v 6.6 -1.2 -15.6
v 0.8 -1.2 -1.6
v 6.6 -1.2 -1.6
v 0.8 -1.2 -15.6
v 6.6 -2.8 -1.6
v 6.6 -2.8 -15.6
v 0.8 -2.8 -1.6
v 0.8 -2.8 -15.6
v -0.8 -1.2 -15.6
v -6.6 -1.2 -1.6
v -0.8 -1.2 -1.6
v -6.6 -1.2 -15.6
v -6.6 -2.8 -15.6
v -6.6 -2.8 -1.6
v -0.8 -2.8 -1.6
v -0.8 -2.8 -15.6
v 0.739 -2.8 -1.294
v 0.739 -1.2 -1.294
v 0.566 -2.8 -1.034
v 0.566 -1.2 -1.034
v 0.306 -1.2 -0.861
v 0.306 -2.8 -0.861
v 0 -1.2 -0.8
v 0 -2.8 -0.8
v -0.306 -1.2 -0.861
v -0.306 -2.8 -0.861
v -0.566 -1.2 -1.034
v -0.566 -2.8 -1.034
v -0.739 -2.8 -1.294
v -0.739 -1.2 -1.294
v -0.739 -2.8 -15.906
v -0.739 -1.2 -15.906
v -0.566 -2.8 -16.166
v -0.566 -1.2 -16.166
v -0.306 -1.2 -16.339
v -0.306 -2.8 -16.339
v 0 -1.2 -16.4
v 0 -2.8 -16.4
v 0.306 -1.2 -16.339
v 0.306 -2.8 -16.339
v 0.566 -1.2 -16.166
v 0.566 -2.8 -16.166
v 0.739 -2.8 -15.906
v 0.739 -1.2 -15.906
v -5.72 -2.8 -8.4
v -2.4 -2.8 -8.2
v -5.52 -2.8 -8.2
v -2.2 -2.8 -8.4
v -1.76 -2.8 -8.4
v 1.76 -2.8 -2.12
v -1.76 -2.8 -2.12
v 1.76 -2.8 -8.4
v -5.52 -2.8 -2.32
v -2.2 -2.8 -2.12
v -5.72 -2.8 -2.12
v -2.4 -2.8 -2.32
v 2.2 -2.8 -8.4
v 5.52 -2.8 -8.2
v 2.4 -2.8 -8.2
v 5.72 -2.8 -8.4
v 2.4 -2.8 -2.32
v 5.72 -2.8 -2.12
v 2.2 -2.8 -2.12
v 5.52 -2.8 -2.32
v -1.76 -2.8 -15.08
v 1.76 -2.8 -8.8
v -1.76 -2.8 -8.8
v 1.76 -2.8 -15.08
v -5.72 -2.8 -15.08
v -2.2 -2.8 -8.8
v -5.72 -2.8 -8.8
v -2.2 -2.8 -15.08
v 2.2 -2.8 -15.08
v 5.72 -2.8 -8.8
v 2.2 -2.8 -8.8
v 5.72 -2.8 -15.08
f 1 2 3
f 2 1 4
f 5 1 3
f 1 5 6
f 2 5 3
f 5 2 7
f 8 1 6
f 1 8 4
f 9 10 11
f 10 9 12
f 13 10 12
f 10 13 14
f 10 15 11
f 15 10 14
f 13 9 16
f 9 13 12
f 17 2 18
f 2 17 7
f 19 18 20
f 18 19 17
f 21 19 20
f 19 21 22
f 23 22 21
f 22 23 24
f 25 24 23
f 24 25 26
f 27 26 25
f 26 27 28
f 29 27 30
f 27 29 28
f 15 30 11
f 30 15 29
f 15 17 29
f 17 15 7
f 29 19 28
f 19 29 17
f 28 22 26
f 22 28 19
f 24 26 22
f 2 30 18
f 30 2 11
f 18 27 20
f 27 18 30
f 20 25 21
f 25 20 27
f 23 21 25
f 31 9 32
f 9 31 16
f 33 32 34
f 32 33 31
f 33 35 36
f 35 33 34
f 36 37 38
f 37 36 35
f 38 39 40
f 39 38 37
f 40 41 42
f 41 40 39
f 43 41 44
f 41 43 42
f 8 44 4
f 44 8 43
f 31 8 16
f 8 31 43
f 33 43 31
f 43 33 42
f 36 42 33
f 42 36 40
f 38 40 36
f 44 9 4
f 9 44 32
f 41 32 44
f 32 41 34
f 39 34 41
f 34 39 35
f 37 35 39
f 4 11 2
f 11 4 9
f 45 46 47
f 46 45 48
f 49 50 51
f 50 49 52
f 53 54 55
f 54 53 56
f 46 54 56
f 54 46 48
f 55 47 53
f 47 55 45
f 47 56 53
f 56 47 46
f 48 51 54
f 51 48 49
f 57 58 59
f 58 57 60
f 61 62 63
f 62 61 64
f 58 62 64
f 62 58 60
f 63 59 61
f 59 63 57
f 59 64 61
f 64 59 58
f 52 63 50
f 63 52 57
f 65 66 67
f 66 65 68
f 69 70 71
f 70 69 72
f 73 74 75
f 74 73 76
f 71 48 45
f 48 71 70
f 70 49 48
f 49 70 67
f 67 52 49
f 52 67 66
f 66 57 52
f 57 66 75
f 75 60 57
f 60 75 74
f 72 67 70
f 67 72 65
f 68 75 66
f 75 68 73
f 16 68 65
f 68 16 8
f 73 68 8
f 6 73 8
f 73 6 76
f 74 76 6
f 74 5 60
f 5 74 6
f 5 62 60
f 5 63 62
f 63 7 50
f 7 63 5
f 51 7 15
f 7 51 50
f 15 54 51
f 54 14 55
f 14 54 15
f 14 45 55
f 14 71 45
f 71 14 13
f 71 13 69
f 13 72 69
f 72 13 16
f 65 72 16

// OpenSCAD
// file: ../p/4-4edge.scad
use <../lib.scad>
$fa=1; $fs=0.2;
function ldraw_lib__4_4edge(realsolid=false) = [
// 0 Circle 1.0
// 0 Name: 4-4edge.dat
// 0 Author: James Jessiman
// 0 !LDRAW_ORG Primitive UPDATE 2017-01
// 0 !LICENSE Licensed under CC BY 2.0 and CC BY 4.0 : see CAreadme.txt
// 
// 0 BFC CERTIFY CCW
  [0,"BFC","CERTIFY"],
  [0,"BFC","CCW"],
// 
// 0 !HISTORY 1998-12-15 [PTadmin] Official Update 1998-10
// 0 !HISTORY 2005-12-28 [PTadmin] Official Update 2005-01
// 0 !HISTORY 2007-06-24 [PTadmin] Header formatted for Contributor Agreement
// 0 !HISTORY 2008-07-01 [PTadmin] Official Update 2008-01
// 0 !HISTORY 2017-01-15 [Steffen] BFCed
// 0 !HISTORY 2017-12-30 [PTadmin] Official Update 2017-01
// 
// 
// 2 24 1 0 0 0.9239 0 0.3827
  [2,24,1,0,0,0.9239,0,0.3827],
// 2 24 0.9239 0 0.3827 0.7071 0 0.7071
  [2,24,0.9239,0,0.3827,0.7071,0,0.7071],
// 2 24 0.7071 0 0.7071 0.3827 0 0.9239
  [2,24,0.7071,0,0.7071,0.3827,0,0.9239],
// 2 24 0.3827 0 0.9239 0 0 1
  [2,24,0.3827,0,0.9239,0,0,1],
// 2 24 0 0 1 -0.3827 0 0.9239
  [2,24,0,0,1,-0.3827,0,0.9239],
// 2 24 -0.3827 0 0.9239 -0.7071 0 0.7071
  [2,24,-0.3827,0,0.9239,-0.7071,0,0.7071],
// 2 24 -0.7071 0 0.7071 -0.9239 0 0.3827
  [2,24,-0.7071,0,0.7071,-0.9239,0,0.3827],
// 2 24 -0.9239 0 0.3827 -1 0 -0
  [2,24,-0.9239,0,0.3827,-1,0,-0],
// 2 24 -1 0 -0 -0.9239 0 -0.3827
  [2,24,-1,0,-0,-0.9239,0,-0.3827],
// 2 24 -0.9239 0 -0.3827 -0.7071 0 -0.7071
  [2,24,-0.9239,0,-0.3827,-0.7071,0,-0.7071],
// 2 24 -0.7071 0 -0.7071 -0.3827 0 -0.9239
  [2,24,-0.7071,0,-0.7071,-0.3827,0,-0.9239],
// 2 24 -0.3827 0 -0.9239 0 0 -1
  [2,24,-0.3827,0,-0.9239,0,0,-1],
// 2 24 0 0 -1 0.3827 0 -0.9239
  [2,24,0,0,-1,0.3827,0,-0.9239],
// 2 24 0.3827 0 -0.9239 0.7071 0 -0.7071
  [2,24,0.3827,0,-0.9239,0.7071,0,-0.7071],
// 2 24 0.7071 0 -0.7071 0.9239 0 -0.3827
  [2,24,0.7071,0,-0.7071,0.9239,0,-0.3827],
// 2 24 0.9239 0 -0.3827 1 0 0
  [2,24,0.9239,0,-0.3827,1,0,0],
];
module ldraw_lib__4_4edge(step=0, col=false, unit=2/5, alt=false, line=0.2, solid=!$preview)
    makepoly(ldraw_lib__4_4edge(solid), step=step, col=col, unit=unit, alt=alt, line=line, solid=solid);
ldraw_lib__4_4edge(line=0.2);
// file: ../p/4-4disc.scad
use <../lib.scad>
$fa=1; $fs=0.2;
function ldraw_lib__4_4disc(realsolid=false) = [
// 0 Disc 1.0
// 0 Name: 4-4disc.dat
// 0 Author: James Jessiman
// 0 !LDRAW_ORG Primitive UPDATE 2002-02
// 0 !LICENSE Licensed under CC BY 2.0 and CC BY 4.0 : see CAreadme.txt
// 
// 0 BFC CERTIFY CCW
  [0,"BFC","CERTIFY"],
  [0,"BFC","CCW"],
// 
// 0 !HISTORY 1998-12-15 [PTadmin] Official Update 1998-10
// 0 !HISTORY 2002-03-23 [sbliss] Added BFC statement
// 0 !HISTORY 2002-04-25 [PTadmin] Official Update 2002-02
// 0 !HISTORY 2007-06-24 [PTadmin] Header formatted for Contributor Agreement
// 0 !HISTORY 2008-07-01 [PTadmin] Official Update 2008-01
// 
// 
// 3 16 0 0 0 1 0 0 0.9239 0 0.3827
  [3,16,0,0,0,1,0,0,0.9239,0,0.3827],
// 3 16 0 0 0 0.9239 0 0.3827 0.7071 0 0.7071
  [3,16,0,0,0,0.9239,0,0.3827,0.7071,0,0.7071],
// 3 16 0 0 0 0.7071 0 0.7071 0.3827 0 0.9239
  [3,16,0,0,0,0.7071,0,0.7071,0.3827,0,0.9239],
// 3 16 0 0 0 0.3827 0 0.9239 0 0 1
  [3,16,0,0,0,0.3827,0,0.9239,0,0,1],
// 3 16 0 0 0 0 0 1 -0.3827 0 0.9239
  [3,16,0,0,0,0,0,1,-0.3827,0,0.9239],
// 3 16 0 0 0 -0.3827 0 0.9239 -0.7071 0 0.7071
  [3,16,0,0,0,-0.3827,0,0.9239,-0.7071,0,0.7071],
// 3 16 0 0 0 -0.7071 0 0.7071 -0.9239 0 0.3827
  [3,16,0,0,0,-0.7071,0,0.7071,-0.9239,0,0.3827],
// 3 16 0 0 0 -0.9239 0 0.3827 -1 0 -0
  [3,16,0,0,0,-0.9239,0,0.3827,-1,0,-0],
// 3 16 0 0 0 -1 0 -0 -0.9239 0 -0.3827
  [3,16,0,0,0,-1,0,-0,-0.9239,0,-0.3827],
// 3 16 0 0 0 -0.9239 0 -0.3827 -0.7071 0 -0.7071
  [3,16,0,0,0,-0.9239,0,-0.3827,-0.7071,0,-0.7071],
// 3 16 0 0 0 -0.7071 0 -0.7071 -0.3827 0 -0.9239
  [3,16,0,0,0,-0.7071,0,-0.7071,-0.3827,0,-0.9239],
// 3 16 0 0 0 -0.3827 0 -0.9239 0 0 -1
  [3,16,0,0,0,-0.3827,0,-0.9239,0,0,-1],
// 3 16 0 0 0 0 0 -1 0.3827 0 -0.9239
  [3,16,0,0,0,0,0,-1,0.3827,0,-0.9239],
// 3 16 0 0 0 0.3827 0 -0.9239 0.7071 0 -0.7071
  [3,16,0,0,0,0.3827,0,-0.9239,0.7071,0,-0.7071],
// 3 16 0 0 0 0.7071 0 -0.7071 0.9239 0 -0.3827
  [3,16,0,0,0,0.7071,0,-0.7071,0.9239,0,-0.3827],
// 3 16 0 0 0 0.9239 0 -0.3827 1 0 0
  [3,16,0,0,0,0.9239,0,-0.3827,1,0,0],
// 0
];
module ldraw_lib__4_4disc(step=0, col=false, unit=2/5, alt=false, line=0.2, solid=!$preview)
    makepoly(ldraw_lib__4_4disc(solid), step=step, col=col, unit=unit, alt=alt, line=line, solid=solid);
ldraw_lib__4_4disc(line=0.2);
// file: ../p/4-4cyli.scad
use <../lib.scad>
$fa=1; $fs=0.2;
function ldraw_lib__4_4cyli(realsolid=false) = [
// 0 Cylinder 1.0
// 0 Name: 4-4cyli.dat
// 0 Author: James Jessiman
// 0 !LDRAW_ORG Primitive UPDATE 2005-01
// 0 !LICENSE Licensed under CC BY 2.0 and CC BY 4.0 : see CAreadme.txt
// 
// 0 BFC CERTIFY CCW
  [0,"BFC","CERTIFY"],
  [0,"BFC","CCW"],
// 
// 0 !HISTORY 1998-12-15 [PTadmin] Official Update 1998-10
// 0 !HISTORY 2002-03-23 [sbliss] Added BFC statement; merged headers from files in distributions LDraw 0.27 and Complete.
// 0 !HISTORY 2002-04-25 [PTadmin] Official Update 2002-02
// 0 !HISTORY 2004-12-14 [guyvivan] BFC CCW
// 0 !HISTORY 2005-12-28 [PTadmin] Official Update 2005-01
// 0 !HISTORY 2007-06-24 [PTadmin] Header formatted for Contributor Agreement
// 0 !HISTORY 2008-07-01 [PTadmin] Official Update 2008-01
// 
// 
// 4 16 1 1 0 0.9239 1 0.3827 0.9239 0 0.3827 1 0 0
  [4,16,1,1,0,0.9239,1,0.3827,0.9239,0,0.3827,1,0,0],
// 5 24 1 0 0 1 1 0 0.9239 0 0.3827 0.9239 0 -0.3827
  [5,24,1,0,0,1,1,0,0.9239,0,0.3827,0.9239,0,-0.3827],
// 4 16 0.9239 1 0.3827 0.7071 1 0.7071 0.7071 0 0.7071 0.9239 0 0.3827
  [4,16,0.9239,1,0.3827,0.7071,1,0.7071,0.7071,0,0.7071,0.9239,0,0.3827],
// 5 24 0.9239 0 0.3827 0.9239 1 0.3827 0.7071 0 0.7071 1 0 0
  [5,24,0.9239,0,0.3827,0.9239,1,0.3827,0.7071,0,0.7071,1,0,0],
// 4 16 0.7071 1 0.7071 0.3827 1 0.9239 0.3827 0 0.9239 0.7071 0 0.7071
  [4,16,0.7071,1,0.7071,0.3827,1,0.9239,0.3827,0,0.9239,0.7071,0,0.7071],
// 5 24 0.7071 0 0.7071 0.7071 1 0.7071 0.3827 0 0.9239 0.9239 0 0.3827
  [5,24,0.7071,0,0.7071,0.7071,1,0.7071,0.3827,0,0.9239,0.9239,0,0.3827],
// 4 16 0.3827 1 0.9239 0 1 1 0 0 1 0.3827 0 0.9239
  [4,16,0.3827,1,0.9239,0,1,1,0,0,1,0.3827,0,0.9239],
// 5 24 0.3827 0 0.9239 0.3827 1 0.9239 0 0 1 0.7071 0 0.7071
  [5,24,0.3827,0,0.9239,0.3827,1,0.9239,0,0,1,0.7071,0,0.7071],
// 4 16 0 1 1 -0.3827 1 0.9239 -0.3827 0 0.9239 0 0 1
  [4,16,0,1,1,-0.3827,1,0.9239,-0.3827,0,0.9239,0,0,1],
// 5 24 0 0 1 0 1 1 -0.3827 0 0.9239 0.3827 0 0.9239
  [5,24,0,0,1,0,1,1,-0.3827,0,0.9239,0.3827,0,0.9239],
// 4 16 -0.3827 1 0.9239 -0.7071 1 0.7071 -0.7071 0 0.7071 -0.3827 0 0.9239
  [4,16,-0.3827,1,0.9239,-0.7071,1,0.7071,-0.7071,0,0.7071,-0.3827,0,0.9239],
// 5 24 -0.3827 0 0.9239 -0.3827 1 0.9239 -0.7071 0 0.7071 0 0 1
  [5,24,-0.3827,0,0.9239,-0.3827,1,0.9239,-0.7071,0,0.7071,0,0,1],
// 4 16 -0.7071 1 0.7071 -0.9239 1 0.3827 -0.9239 0 0.3827 -0.7071 0 0.7071
  [4,16,-0.7071,1,0.7071,-0.9239,1,0.3827,-0.9239,0,0.3827,-0.7071,0,0.7071],
// 5 24 -0.7071 0 0.7071 -0.7071 1 0.7071 -0.9239 0 0.3827 -0.3827 0 0.9239
  [5,24,-0.7071,0,0.7071,-0.7071,1,0.7071,-0.9239,0,0.3827,-0.3827,0,0.9239],
// 4 16 -0.9239 1 0.3827 -1 1 0 -1 0 0 -0.9239 0 0.3827
  [4,16,-0.9239,1,0.3827,-1,1,0,-1,0,0,-0.9239,0,0.3827],
// 5 24 -0.9239 0 0.3827 -0.9239 1 0.3827 -1 0 0 -0.7071 0 0.7071
  [5,24,-0.9239,0,0.3827,-0.9239,1,0.3827,-1,0,0,-0.7071,0,0.7071],
// 4 16 -1 1 0 -0.9239 1 -0.3827 -0.9239 0 -0.3827 -1 0 0
  [4,16,-1,1,0,-0.9239,1,-0.3827,-0.9239,0,-0.3827,-1,0,0],
// 5 24 -1 0 0 -1 1 0 -0.9239 0 -0.3827 -0.9239 0 0.3827
  [5,24,-1,0,0,-1,1,0,-0.9239,0,-0.3827,-0.9239,0,0.3827],
// 4 16 -0.9239 1 -0.3827 -0.7071 1 -0.7071 -0.7071 0 -0.7071 -0.9239 0 -0.3827
  [4,16,-0.9239,1,-0.3827,-0.7071,1,-0.7071,-0.7071,0,-0.7071,-0.9239,0,-0.3827],
// 5 24 -0.9239 0 -0.3827 -0.9239 1 -0.3827 -0.7071 0 -0.7071 -1 0 0
  [5,24,-0.9239,0,-0.3827,-0.9239,1,-0.3827,-0.7071,0,-0.7071,-1,0,0],
// 4 16 -0.7071 1 -0.7071 -0.3827 1 -0.9239 -0.3827 0 -0.9239 -0.7071 0 -0.7071
  [4,16,-0.7071,1,-0.7071,-0.3827,1,-0.9239,-0.3827,0,-0.9239,-0.7071,0,-0.7071],
// 5 24 -0.7071 0 -0.7071 -0.7071 1 -0.7071 -0.3827 0 -0.9239 -0.9239 0 -0.3827
  [5,24,-0.7071,0,-0.7071,-0.7071,1,-0.7071,-0.3827,0,-0.9239,-0.9239,0,-0.3827],
// 4 16 -0.3827 1 -0.9239 0 1 -1 0 0 -1 -0.3827 0 -0.9239
  [4,16,-0.3827,1,-0.9239,0,1,-1,0,0,-1,-0.3827,0,-0.9239],
// 5 24 -0.3827 0 -0.9239 -0.3827 1 -0.9239 0 0 -1 -0.7071 0 -0.7071
  [5,24,-0.3827,0,-0.9239,-0.3827,1,-0.9239,0,0,-1,-0.7071,0,-0.7071],
// 4 16 0 1 -1 0.3827 1 -0.9239 0.3827 0 -0.9239 0 0 -1
  [4,16,0,1,-1,0.3827,1,-0.9239,0.3827,0,-0.9239,0,0,-1],
// 5 24 0 0 -1 0 1 -1 0.3827 0 -0.9239 -0.3827 0 -0.9239
  [5,24,0,0,-1,0,1,-1,0.3827,0,-0.9239,-0.3827,0,-0.9239],
// 4 16 0.3827 1 -0.9239 0.7071 1 -0.7071 0.7071 0 -0.7071 0.3827 0 -0.9239
  [4,16,0.3827,1,-0.9239,0.7071,1,-0.7071,0.7071,0,-0.7071,0.3827,0,-0.9239],
// 5 24 0.3827 0 -0.9239 0.3827 1 -0.9239 0.7071 0 -0.7071 0 0 -1
  [5,24,0.3827,0,-0.9239,0.3827,1,-0.9239,0.7071,0,-0.7071,0,0,-1],
// 4 16 0.7071 1 -0.7071 0.9239 1 -0.3827 0.9239 0 -0.3827 0.7071 0 -0.7071
  [4,16,0.7071,1,-0.7071,0.9239,1,-0.3827,0.9239,0,-0.3827,0.7071,0,-0.7071],
// 5 24 0.7071 0 -0.7071 0.7071 1 -0.7071 0.9239 0 -0.3827 0.3827 0 -0.9239
  [5,24,0.7071,0,-0.7071,0.7071,1,-0.7071,0.9239,0,-0.3827,0.3827,0,-0.9239],
// 4 16 0.9239 1 -0.3827 1 1 0 1 0 0 0.9239 0 -0.3827
  [4,16,0.9239,1,-0.3827,1,1,0,1,0,0,0.9239,0,-0.3827],
// 5 24 0.9239 0 -0.3827 0.9239 1 -0.3827 1 0 0 0.7071 0 -0.7071
  [5,24,0.9239,0,-0.3827,0.9239,1,-0.3827,1,0,0,0.7071,0,-0.7071],
// 0
];
module ldraw_lib__4_4cyli(step=0, col=false, unit=2/5, alt=false, line=0.2, solid=!$preview)
    makepoly(ldraw_lib__4_4cyli(solid), step=step, col=col, unit=unit, alt=alt, line=line, solid=solid);
ldraw_lib__4_4cyli(line=0.2);
// file: ../p/stud3.scad
use <../lib.scad>
use <4-4cyli.scad>
use <4-4disc.scad>
use <4-4edge.scad>
$fa=1; $fs=0.2;
function ldraw_lib__stud3(realsolid=false) = realsolid ? 
    [openscad(translate([0,0,-eps()], o=cylinder(4+eps(), r=4)),2)] : [
// 0 Stud Tube Solid
// 0 Name: stud3.dat
// 0 Author: James Jessiman
// 0 !LDRAW_ORG Primitive UPDATE 2012-01
// 0 !LICENSE Licensed under CC BY 2.0 and CC BY 4.0 : see CAreadme.txt
// 
// 0 BFC CERTIFY CCW
  [0,"BFC","CERTIFY"],
  [0,"BFC","CCW"],
// 
// 0 !HISTORY 2002-04-04 [sbliss] Modified for BFC compliance
// 0 !HISTORY 2002-04-25 [PTadmin] Official Update 2002-02
// 0 !HISTORY 2007-06-24 [PTadmin] Header formatted for Contributor Agreement
// 0 !HISTORY 2008-07-01 [PTadmin] Official Update 2008-01
// 0 !HISTORY 2012-02-16 [Philo] Changed to CCW
// 0 !HISTORY 2012-03-30 [PTadmin] Official Update 2012-01
// 
// 
// 1 16 0 -4 0 4 0 0 0 1 0 0 0 4 4-4edge.dat
  [1,16,0,-4,0,4,0,0,0,1,0,0,0,4, ldraw_lib__4_4edge(realsolid)],
// 1 16 0 0 0 4 0 0 0 1 0 0 0 4 4-4edge.dat
  [1,16,0,0,0,4,0,0,0,1,0,0,0,4, ldraw_lib__4_4edge(realsolid)],
// 1 16 0 -4 0 4 0 0 0 1 0 0 0 4 4-4disc.dat
  [1,16,0,-4,0,4,0,0,0,1,0,0,0,4, ldraw_lib__4_4disc(realsolid)],
// 1 16 0 -4 0 4 0 0 0 4 0 0 0 4 4-4cyli.dat
  [1,16,0,-4,0,4,0,0,0,4,0,0,0,4, ldraw_lib__4_4cyli(realsolid)],
];
module ldraw_lib__stud3(step=0, col=false, unit=2/5, alt=false, line=0.2, solid=!$preview)
    makepoly(ldraw_lib__stud3(solid), step=step, col=col, unit=unit, alt=alt, line=line, solid=solid);
ldraw_lib__stud3(line=0.2);
// file: ../p/stud.scad
use <../lib.scad>
use <4-4cyli.scad>
use <4-4disc.scad>
use <4-4edge.scad>
$fa=1; $fs=0.2;
function ldraw_lib__stud(realsolid=false) = realsolid ? 
    [openscad(translate([0,0,-eps()], o=cylinder(4+eps(), r=6)),2)] : [
// 0 Stud
// 0 Name: stud.dat
// 0 Author: James Jessiman
// 0 !LDRAW_ORG Primitive UPDATE 2012-01
// 0 !LICENSE Licensed under CC BY 2.0 and CC BY 4.0 : see CAreadme.txt
// 
// 0 BFC CERTIFY CCW
  [0,"BFC","CERTIFY"],
  [0,"BFC","CCW"],
// 
// 0 !HISTORY 2002-04-04 [sbliss] Modified for BFC compliance
// 0 !HISTORY 2002-04-25 [PTadmin] Official Update 2002-02
// 0 !HISTORY 2007-06-24 [PTadmin] Header formatted for Contributor Agreement
// 0 !HISTORY 2008-07-01 [PTadmin] Official Update 2008-01
// 0 !HISTORY 2012-02-16 [Philo] Changed to CCW
// 0 !HISTORY 2012-03-30 [PTadmin] Official Update 2012-01
// 
// 
// 1 16 0 0 0 6 0 0 0 1 0 0 0 6 4-4edge.dat
  [1,16,0,0,0,6,0,0,0,1,0,0,0,6, ldraw_lib__4_4edge(realsolid)],
// 1 16 0 -4 0 6 0 0 0 1 0 0 0 6 4-4edge.dat
  [1,16,0,-4,0,6,0,0,0,1,0,0,0,6, ldraw_lib__4_4edge(realsolid)],
// 1 16 0 0 0 6 0 0 0 -4 0 0 0 6 4-4cyli.dat
  [1,16,0,0,0,6,0,0,0,-4,0,0,0,6, ldraw_lib__4_4cyli(realsolid)],
// 1 16 0 -4 0 6 0 0 0 1 0 0 0 6 4-4disc.dat
  [1,16,0,-4,0,6,0,0,0,1,0,0,0,6, ldraw_lib__4_4disc(realsolid)],
];
module ldraw_lib__stud(step=0, col=false, unit=2/5, alt=false, line=0.2, solid=!$preview)
    makepoly(ldraw_lib__stud(solid), step=step, col=col, unit=unit, alt=alt, line=line, solid=solid);
ldraw_lib__stud(line=0.2);
// file: ../p/box5.scad
use <../lib.scad>
$fa=1; $fs=0.2;
function ldraw_lib__box5(realsolid=false) = [
// 0 Box with 5 Faces and All Edges
// 0 Name: box5.dat
// 0 Author: James Jessiman
// 0 !LDRAW_ORG Primitive UPDATE 2012-01
// 0 !LICENSE Licensed under CC BY 2.0 and CC BY 4.0 : see CAreadme.txt
// 
// 0 BFC CERTIFY CCW
  [0,"BFC","CERTIFY"],
  [0,"BFC","CCW"],
// 
// 0 !HISTORY 2002-04-03 [sbliss] Modified for BFC compliance
// 0 !HISTORY 2002-04-25 [PTadmin] Official Update 2002-02
// 0 !HISTORY 2007-06-24 [PTadmin] Header formatted for Contributor Agreement
// 0 !HISTORY 2008-07-01 [PTadmin] Official Update 2008-01
// 0 !HISTORY 2012-02-16 [Philo] Changed to CCW
// 0 !HISTORY 2012-03-30 [PTadmin] Official Update 2012-01
// 
// 
// 2 24 1 1 1 -1 1 1
  [2,24,1,1,1,-1,1,1],
// 2 24 -1 1 1 -1 1 -1
  [2,24,-1,1,1,-1,1,-1],
// 2 24 -1 1 -1 1 1 -1
  [2,24,-1,1,-1,1,1,-1],
// 2 24 1 1 -1 1 1 1
  [2,24,1,1,-1,1,1,1],
// 2 24 1 0 1 -1 0 1
  [2,24,1,0,1,-1,0,1],
// 2 24 -1 0 1 -1 0 -1
  [2,24,-1,0,1,-1,0,-1],
// 2 24 -1 0 -1 1 0 -1
  [2,24,-1,0,-1,1,0,-1],
// 2 24 1 0 -1 1 0 1
  [2,24,1,0,-1,1,0,1],
// 2 24 1 0 1 1 1 1
  [2,24,1,0,1,1,1,1],
// 2 24 -1 0 1 -1 1 1
  [2,24,-1,0,1,-1,1,1],
// 2 24 1 0 -1 1 1 -1
  [2,24,1,0,-1,1,1,-1],
// 2 24 -1 0 -1 -1 1 -1
  [2,24,-1,0,-1,-1,1,-1],
// 4 16 -1 1 1 1 1 1 1 1 -1 -1 1 -1
  [4,16,-1,1,1,1,1,1,1,1,-1,-1,1,-1],
// 4 16 -1 1 1 -1 0 1 1 0 1 1 1 1
  [4,16,-1,1,1,-1,0,1,1,0,1,1,1,1],
// 4 16 -1 1 -1 -1 0 -1 -1 0 1 -1 1 1
  [4,16,-1,1,-1,-1,0,-1,-1,0,1,-1,1,1],
// 4 16 1 1 -1 1 0 -1 -1 0 -1 -1 1 -1
  [4,16,1,1,-1,1,0,-1,-1,0,-1,-1,1,-1],
// 4 16 1 1 1 1 0 1 1 0 -1 1 1 -1
  [4,16,1,1,1,1,0,1,1,0,-1,1,1,-1],
];
module ldraw_lib__box5(step=0, col=false, unit=2/5, alt=false, line=0.2, solid=!$preview)
    makepoly(ldraw_lib__box5(solid), step=step, col=col, unit=unit, alt=alt, line=line, solid=solid);
ldraw_lib__box5(line=0.2);
// file: ../p/box4t.scad
use <../lib.scad>
$fa=1; $fs=0.2;
function ldraw_lib__box4t(realsolid=false) = [
// 0 Box with 4 Adjacent Faces and All Edges
// 0 Name: box4t.dat
// 0 Author: Tore Eriksson [Tore_Eriksson]
// 0 !LDRAW_ORG Primitive UPDATE 2003-02
// 0 !LICENSE Licensed under CC BY 2.0 and CC BY 4.0 : see CAreadme.txt
// 
// 0 BFC CERTIFY CCW
  [0,"BFC","CERTIFY"],
  [0,"BFC","CCW"],
// 
// 0 !HISTORY 1997-09-29 [PTadmin] Official Update 1997-15
// 0 !HISTORY 2002-08-31 [izanette] Modified with WINDZ for BFC compliance
// 0 !HISTORY 2003-08-01 [PTadmin] Official Update 2003-02
// 0 !HISTORY 2007-06-24 [PTadmin] Header formatted for Contributor Agreement
// 0 !HISTORY 2008-07-01 [PTadmin] Official Update 2008-01
// 
// 
// 2 24 1 1 1 -1 1 1
  [2,24,1,1,1,-1,1,1],
// 2 24 -1 1 1 -1 1 -1
  [2,24,-1,1,1,-1,1,-1],
// 2 24 -1 1 -1 1 1 -1
  [2,24,-1,1,-1,1,1,-1],
// 2 24 1 1 -1 1 1 1
  [2,24,1,1,-1,1,1,1],
// 2 24 1 0 1 -1 0 1
  [2,24,1,0,1,-1,0,1],
// 2 24 -1 0 1 -1 0 -1
  [2,24,-1,0,1,-1,0,-1],
// 2 24 -1 0 -1 1 0 -1
  [2,24,-1,0,-1,1,0,-1],
// 2 24 1 0 -1 1 0 1
  [2,24,1,0,-1,1,0,1],
// 2 24 1 0 1 1 1 1
  [2,24,1,0,1,1,1,1],
// 2 24 -1 0 1 -1 1 1
  [2,24,-1,0,1,-1,1,1],
// 2 24 1 0 -1 1 1 -1
  [2,24,1,0,-1,1,1,-1],
// 2 24 -1 0 -1 -1 1 -1
  [2,24,-1,0,-1,-1,1,-1],
// 4 16 1 1 1 1 1 -1 -1 1 -1 -1 1 1
  [4,16,1,1,1,1,1,-1,-1,1,-1,-1,1,1],
// 4 16 1 1 1 -1 1 1 -1 0 1 1 0 1
  [4,16,1,1,1,-1,1,1,-1,0,1,1,0,1],
// 4 16 -1 1 1 -1 1 -1 -1 0 -1 -1 0 1
  [4,16,-1,1,1,-1,1,-1,-1,0,-1,-1,0,1],
// 0 4 16 -1 1 -1 -1 0 -1 1 0 -1 1 1 -1
// 4 16 1 1 -1 1 1 1 1 0 1 1 0 -1
  [4,16,1,1,-1,1,1,1,1,0,1,1,0,-1],
// 0
];
module ldraw_lib__box4t(step=0, col=false, unit=2/5, alt=false, line=0.2, solid=!$preview)
    makepoly(ldraw_lib__box4t(solid), step=step, col=col, unit=unit, alt=alt, line=line, solid=solid);
ldraw_lib__box4t(line=0.2);
// file: ../p/2-4edge.scad
use <../lib.scad>
$fa=1; $fs=0.2;
function ldraw_lib__2_4edge(realsolid=false) = [
// 0 Circle 0.5
// 0 Name: 2-4edge.dat
// 0 Author: James Jessiman
// 0 !LDRAW_ORG Primitive UPDATE 2017-01
// 0 !LICENSE Licensed under CC BY 2.0 and CC BY 4.0 : see CAreadme.txt
// 
// 0 BFC CERTIFY CCW
  [0,"BFC","CERTIFY"],
  [0,"BFC","CCW"],
// 
// 0 !HISTORY 2007-06-24 [PTadmin] Header formatted for Contributor Agreement
// 0 !HISTORY 2008-07-01 [PTadmin] Official Update 2008-01
// 0 !HISTORY 2017-01-15 [Steffen] BFCed
// 0 !HISTORY 2017-12-30 [PTadmin] Official Update 2017-01
// 
// 
// 2 24 1 0 0 0.9239 0 0.3827
  [2,24,1,0,0,0.9239,0,0.3827],
// 2 24 0.9239 0 0.3827 0.7071 0 0.7071
  [2,24,0.9239,0,0.3827,0.7071,0,0.7071],
// 2 24 0.7071 0 0.7071 0.3827 0 0.9239
  [2,24,0.7071,0,0.7071,0.3827,0,0.9239],
// 2 24 0.3827 0 0.9239 0 0 1
  [2,24,0.3827,0,0.9239,0,0,1],
// 2 24 0 0 1 -0.3827 0 0.9239
  [2,24,0,0,1,-0.3827,0,0.9239],
// 2 24 -0.3827 0 0.9239 -0.7071 0 0.7071
  [2,24,-0.3827,0,0.9239,-0.7071,0,0.7071],
// 2 24 -0.7071 0 0.7071 -0.9239 0 0.3827
  [2,24,-0.7071,0,0.7071,-0.9239,0,0.3827],
// 2 24 -0.9239 0 0.3827 -1 0 0
  [2,24,-0.9239,0,0.3827,-1,0,0],
];
module ldraw_lib__2_4edge(step=0, col=false, unit=2/5, alt=false, line=0.2, solid=!$preview)
    makepoly(ldraw_lib__2_4edge(solid), step=step, col=col, unit=unit, alt=alt, line=line, solid=solid);
ldraw_lib__2_4edge(line=0.2);
// file: ../p/2-4cyli.scad
use <../lib.scad>
$fa=1; $fs=0.2;
function ldraw_lib__2_4cyli(realsolid=false) = [
// 0 Cylinder 0.5
// 0 Name: 2-4cyli.dat
// 0 Author: James Jessiman
// 0 !LDRAW_ORG Primitive UPDATE 2005-01
// 0 !LICENSE Licensed under CC BY 2.0 and CC BY 4.0 : see CAreadme.txt
// 
// 0 BFC CERTIFY CCW
  [0,"BFC","CERTIFY"],
  [0,"BFC","CCW"],
// 
// 0 !HISTORY 2002-03-23 [sbliss] Added BFC statement; compacted code
// 0 !HISTORY 2002-04-25 [PTadmin] Official Update 2002-02
// 0 !HISTORY 2004-12-11 [nielsk] Recreated using Primitive Generator, Edge lines fixed, BFC changed to CCW
// 0 !HISTORY 2005-12-28 [PTadmin] Official Update 2005-01
// 0 !HISTORY 2007-06-24 [PTadmin] Header formatted for Contributor Agreement
// 0 !HISTORY 2008-07-01 [PTadmin] Official Update 2008-01
// 
// 
// 4 16 .9239 1 .3827 .9239 0 .3827 1 0 0 1 1 0
  [4,16,.9239,1,.3827,.9239,0,.3827,1,0,0,1,1,0],
// 4 16 .7071 1 .7071 .7071 0 .7071 .9239 0 .3827 .9239 1 .3827
  [4,16,.7071,1,.7071,.7071,0,.7071,.9239,0,.3827,.9239,1,.3827],
// 4 16 .3827 1 .9239 .3827 0 .9239 .7071 0 .7071 .7071 1 .7071
  [4,16,.3827,1,.9239,.3827,0,.9239,.7071,0,.7071,.7071,1,.7071],
// 4 16 0 1 1 0 0 1 .3827 0 .9239 .3827 1 .9239
  [4,16,0,1,1,0,0,1,.3827,0,.9239,.3827,1,.9239],
// 4 16 -.3827 1 .9239 -.3827 0 .9239 0 0 1 0 1 1
  [4,16,-.3827,1,.9239,-.3827,0,.9239,0,0,1,0,1,1],
// 4 16 -.7071 1 .7071 -.7071 0 .7071 -.3827 0 .9239 -.3827 1 .9239
  [4,16,-.7071,1,.7071,-.7071,0,.7071,-.3827,0,.9239,-.3827,1,.9239],
// 4 16 -.9239 1 .3827 -.9239 0 .3827 -.7071 0 .7071 -.7071 1 .7071
  [4,16,-.9239,1,.3827,-.9239,0,.3827,-.7071,0,.7071,-.7071,1,.7071],
// 4 16 -1 1 0 -1 0 0 -.9239 0 .3827 -.9239 1 .3827
  [4,16,-1,1,0,-1,0,0,-.9239,0,.3827,-.9239,1,.3827],
// 5 24 1 1 0 1 0 0 1 1 -.4142 .9239 1 .3827
  [5,24,1,1,0,1,0,0,1,1,-.4142,.9239,1,.3827],
// 5 24 .9239 1 .3827 .9239 0 .3827 1 1 0 .7071 1 .7071
  [5,24,.9239,1,.3827,.9239,0,.3827,1,1,0,.7071,1,.7071],
// 5 24 .7071 1 .7071 .7071 0 .7071 .9239 1 .3827 .3827 1 .9239
  [5,24,.7071,1,.7071,.7071,0,.7071,.9239,1,.3827,.3827,1,.9239],
// 5 24 .3827 1 .9239 .3827 0 .9239 .7071 1 .7071 0 1 1
  [5,24,.3827,1,.9239,.3827,0,.9239,.7071,1,.7071,0,1,1],
// 5 24 0 1 1 0 0 1 .3827 1 .9239 -.3827 1 .9239
  [5,24,0,1,1,0,0,1,.3827,1,.9239,-.3827,1,.9239],
// 5 24 -.3827 1 .9239 -.3827 0 .9239 0 1 1 -.7071 1 .7071
  [5,24,-.3827,1,.9239,-.3827,0,.9239,0,1,1,-.7071,1,.7071],
// 5 24 -.7071 1 .7071 -.7071 0 .7071 -.3827 1 .9239 -.9239 1 .3827
  [5,24,-.7071,1,.7071,-.7071,0,.7071,-.3827,1,.9239,-.9239,1,.3827],
// 5 24 -.9239 1 .3827 -.9239 0 .3827 -.7071 1 .7071 -1 1 0
  [5,24,-.9239,1,.3827,-.9239,0,.3827,-.7071,1,.7071,-1,1,0],
// 5 24 -1 1 0 -1 0 0 -.9239 1 .3827 -1 1 -.4142
  [5,24,-1,1,0,-1,0,0,-.9239,1,.3827,-1,1,-.4142],
// 0
];
module ldraw_lib__2_4cyli(step=0, col=false, unit=2/5, alt=false, line=0.2, solid=!$preview)
    makepoly(ldraw_lib__2_4cyli(solid), step=step, col=col, unit=unit, alt=alt, line=line, solid=solid);
ldraw_lib__2_4cyli(line=0.2);
// file: s/3004s01.scad
use <../../lib.scad>
use <../../p/box4t.scad>
use <../../p/box5.scad>
use <../../p/stud.scad>
use <../../p/stud3.scad>
$fa=1; $fs=0.2;
function ldraw_lib__s__3004s01(realsolid=false) = [
// 0 ~Brick  1 x  2 without Front Face
// 0 Name: s\3004s01.dat
// 0 Author: James Jessiman
// 0 !LDRAW_ORG Subpart UPDATE 2003-03
// 0 !LICENSE Licensed under CC BY 2.0 and CC BY 4.0 : see CAreadme.txt
// 
// 0 BFC CERTIFY CCW
  [0,"BFC","CERTIFY"],
  [0,"BFC","CCW"],
// 
// 0 !HISTORY 2003-09-07 [jriley] Subfiling, BFC
// 0 !HISTORY 2003-12-19 [PTadmin] Official Update 2003-03
// 0 !HISTORY 2007-08-29 [PTadmin] Header formatted for Contributor Agreement
// 0 !HISTORY 2008-07-01 [PTadmin] Official Update 2008-01
// 
// 
// 1 16 0 4 0 1 0 0 0 -5 0 0 0 1 stud3.dat
  [1,16,0,4,0,1,0,0,0,-5,0,0,0,1, ldraw_lib__stud3(realsolid)],
// 0 BFC INVERTNEXT
  [0,"BFC","INVERTNEXT"],
// 1 16 0 24 0 16 0 0 0 -20 0 0 0 6 box5.dat
  [1,16,0,24,0,16,0,0,0,-20,0,0,0,6, ldraw_lib__box5(realsolid)],
// 4 16 20 24 10 16 24 6 -16 24 6 -20 24 10
  [4,16,20,24,10,16,24,6,-16,24,6,-20,24,10],
// 4 16 -20 24 10 -16 24 6 -16 24 -6 -20 24 -10
  [4,16,-20,24,10,-16,24,6,-16,24,-6,-20,24,-10],
// 4 16 -20 24 -10 -16 24 -6 16 24 -6 20 24 -10
  [4,16,-20,24,-10,-16,24,-6,16,24,-6,20,24,-10],
// 4 16 20 24 -10 16 24 -6 16 24 6 20 24 10
  [4,16,20,24,-10,16,24,-6,16,24,6,20,24,10],
// 1 16 0 24 0 20 0 0 0 -24 0 0 0 10 box4t.dat
  [1,16,0,24,0,20,0,0,0,-24,0,0,0,10, ldraw_lib__box4t(realsolid)],
// 1 16 10 0 0 1 0 0 0 1 0 0 0 1 stud.dat
  [1,16,10,0,0,1,0,0,0,1,0,0,0,1, ldraw_lib__stud(realsolid)],
// 1 16 -10 0 0 1 0 0 0 1 0 0 0 1 stud.dat
  [1,16,-10,0,0,1,0,0,0,1,0,0,0,1, ldraw_lib__stud(realsolid)],
// 0
];
module ldraw_lib__s__3004s01(step=0, col=false, unit=2/5, alt=false, line=0.2, solid=!$preview)
    makepoly(ldraw_lib__s__3004s01(solid), step=step, col=col, unit=unit, alt=alt, line=line, solid=solid);
ldraw_lib__s__3004s01(line=0.2);
// file: ../p/box4-4a.scad
use <../lib.scad>
$fa=1; $fs=0.2;
function ldraw_lib__box4_4a(realsolid=false) = [
// 0 Box with 4 Faces without 4 Adjacent Edges
// 0 Name: box4-4a.dat
// 0 Author: Manfred Moolhuysen
// 0 !LDRAW_ORG Primitive UPDATE 2012-01
// 0 !LICENSE Licensed under CC BY 2.0 and CC BY 4.0 : see CAreadme.txt
// 
// 0 BFC CERTIFY CCW
  [0,"BFC","CERTIFY"],
  [0,"BFC","CCW"],
// 
// 0 !HISTORY 1998-07-15 [PTadmin] Official Update 1998-07
// 0 !HISTORY 2002-12-13 [hafhead] Made BFC compliant
// 0 !HISTORY 2003-03-12 [PTadmin] Official Update 2003-01
// 0 !HISTORY 2007-06-24 [PTadmin] Header formatted for Contributor Agreement
// 0 !HISTORY 2008-07-01 [PTadmin] Official Update 2008-01
// 0 !HISTORY 2012-02-16 [Philo] Changed to CCW
// 0 !HISTORY 2012-03-30 [PTadmin] Official Update 2012-01
// 
// 
// 2 24 1 1 1 -1 1 1
  [2,24,1,1,1,-1,1,1],
// 2 24 -1 1 1 -1 1 -1
  [2,24,-1,1,1,-1,1,-1],
// 2 24 1 1 -1 1 1 1
  [2,24,1,1,-1,1,1,1],
// 2 24 1 0 1 -1 0 1
  [2,24,1,0,1,-1,0,1],
// 2 24 -1 0 1 -1 0 -1
  [2,24,-1,0,1,-1,0,-1],
// 2 24 1 0 -1 1 0 1
  [2,24,1,0,-1,1,0,1],
// 2 24 1 0 1 1 1 1
  [2,24,1,0,1,1,1,1],
// 2 24 -1 0 1 -1 1 1
  [2,24,-1,0,1,-1,1,1],
// 4 16 1 1 -1 -1 1 -1 -1 1 1 1 1 1
  [4,16,1,1,-1,-1,1,-1,-1,1,1,1,1,1],
// 4 16 -1 1 1 -1 0 1 1 0 1 1 1 1
  [4,16,-1,1,1,-1,0,1,1,0,1,1,1,1],
// 4 16 -1 1 -1 -1 0 -1 -1 0 1 -1 1 1
  [4,16,-1,1,-1,-1,0,-1,-1,0,1,-1,1,1],
// 4 16 1 1 1 1 0 1 1 0 -1 1 1 -1
  [4,16,1,1,1,1,0,1,1,0,-1,1,1,-1],
];
module ldraw_lib__box4_4a(step=0, col=false, unit=2/5, alt=false, line=0.2, solid=!$preview)
    makepoly(ldraw_lib__box4_4a(solid), step=step, col=col, unit=unit, alt=alt, line=line, solid=solid);
ldraw_lib__box4_4a(line=0.2);
// file: ../p/2-4cylo.scad
use <../lib.scad>
use <2-4cyli.scad>
use <2-4edge.scad>
$fa=1; $fs=0.2;
function ldraw_lib__2_4cylo(realsolid=false) = [
// 0 Cylinder Open 0.5
// 0 Name: 2-4cylo.dat
// 0 Author: Max Martin Richter [MMR1988]
// 0 !LDRAW_ORG Primitive UPDATE 2010-03
// 0 !LICENSE Licensed under CC BY 2.0 and CC BY 4.0 : see CAreadme.txt
// 
// 0 BFC CERTIFY CCW
  [0,"BFC","CERTIFY"],
  [0,"BFC","CCW"],
// 
// 0 !HISTORY 2010-12-31 [PTadmin] Official Update 2010-03
// 
// 
// 1 16 0 0 0 1 0 0 0 1 0 0 0 1 2-4edge.dat
  [1,16,0,0,0,1,0,0,0,1,0,0,0,1, ldraw_lib__2_4edge(realsolid)],
// 1 16 0 1 0 1 0 0 0 1 0 0 0 1 2-4edge.dat
  [1,16,0,1,0,1,0,0,0,1,0,0,0,1, ldraw_lib__2_4edge(realsolid)],
// 1 16 0 0 0 1 0 0 0 1 0 0 0 1 2-4cyli.dat
  [1,16,0,0,0,1,0,0,0,1,0,0,0,1, ldraw_lib__2_4cyli(realsolid)],
];
module ldraw_lib__2_4cylo(step=0, col=false, unit=2/5, alt=false, line=0.2, solid=!$preview)
    makepoly(ldraw_lib__2_4cylo(solid), step=step, col=col, unit=unit, alt=alt, line=line, solid=solid);
ldraw_lib__2_4cylo(line=0.2);
// file: ../p/2-4chrd.scad
use <../lib.scad>
$fa=1; $fs=0.2;
function ldraw_lib__2_4chrd(realsolid=false) = [
// 0 Chord 0.5
// 0 Name: 2-4chrd.dat
// 0 Author: Philippe Hurbain [Philo]
// 0 !LDRAW_ORG Primitive UPDATE 2014-01
// 0 !LICENSE Licensed under CC BY 2.0 and CC BY 4.0 : see CAreadme.txt
// 
// 0 BFC CERTIFY CCW
  [0,"BFC","CERTIFY"],
  [0,"BFC","CCW"],
// 
// 0 !HISTORY 2014-06-21 [PTadmin] Official Update 2014-01
// 
// 
// 4 16 0.9239 0 0.3827 -0.9239 0 0.3827 -1 0 0 1 0 0
  [4,16,0.9239,0,0.3827,-0.9239,0,0.3827,-1,0,0,1,0,0],
// 4 16 0.7071 0 0.7071 -0.7071 0 0.7071 -0.9239 0 0.3827 0.9239 0 0.3827
  [4,16,0.7071,0,0.7071,-0.7071,0,0.7071,-0.9239,0,0.3827,0.9239,0,0.3827],
// 4 16 0.3827 0 0.9239 -0.3827 0 0.9239 -0.7071 0 0.7071 0.7071 0 0.7071
  [4,16,0.3827,0,0.9239,-0.3827,0,0.9239,-0.7071,0,0.7071,0.7071,0,0.7071],
// 3 16 0 0 1 -0.3827 0 0.9239 0.3827 0 0.9239
  [3,16,0,0,1,-0.3827,0,0.9239,0.3827,0,0.9239],
];
module ldraw_lib__2_4chrd(step=0, col=false, unit=2/5, alt=false, line=0.2, solid=!$preview)
    makepoly(ldraw_lib__2_4chrd(solid), step=step, col=col, unit=unit, alt=alt, line=line, solid=solid);
ldraw_lib__2_4chrd(line=0.2);
// file: 3004.scad
use <../lib.scad>
use <s/3004s01.scad>
$fa=1; $fs=0.2;
function ldraw_lib__3004(realsolid=false) = [
// 0 Brick  1 x  2
// 0 Name: 3004.dat
// 0 Author: James Jessiman
// 0 !LDRAW_ORG Part UPDATE 2022-05
// 0 !LICENSE Licensed under CC BY 2.0 and CC BY 4.0 : see CAreadme.txt
// 
// 0 BFC CERTIFY CCW
  [0,"BFC","CERTIFY"],
  [0,"BFC","CCW"],
// 
// 0 !HISTORY 2001-10-26 [PTadmin] Official Update 2001-01
// 0 !HISTORY 2002-05-07 {unknown} BFC Certification
// 0 !HISTORY 2002-06-11 [PTadmin] Official Update 2002-03
// 0 !HISTORY 2007-05-07 [PTadmin] Header formatted for Contributor Agreement
// 0 !HISTORY 2008-07-01 [PTadmin] Official Update 2008-01
// 0 !HISTORY 2022-08-04 [MagFors] Using subfile
// 0 !HISTORY 2022-09-15 [PTadmin] Official Update 2022-05
// 
// 
// 1 16 0 0 0 1 0 0 0 1 0 0 0 1 s\3004s01.dat
  [1,16,0,0,0,1,0,0,0,1,0,0,0,1, ldraw_lib__s__3004s01(realsolid)],
// 4 16 -20 24 -10 20 24 -10 20 0 -10 -20 0 -10
  [4,16,-20,24,-10,20,24,-10,20,0,-10,-20,0,-10],
];
module ldraw_lib__3004(step=0, col=false, unit=2/5, alt=false, line=0.2, solid=!$preview)
    makepoly(ldraw_lib__3004(solid), step=step, col=col, unit=unit, alt=alt, line=line, solid=solid);
ldraw_lib__3004(line=0.2);
// file: s/60601s01.scad
use <../../lib.scad>
use <../../p/2-4chrd.scad>
use <../../p/2-4cylo.scad>
use <../../p/box4-4a.scad>
$fa=1; $fs=0.2;
function ldraw_lib__s__60601s01(realsolid=false) = [
// 0 ~Glass for Window  1 x  2 x  2 without Front Surface
// 0 Name: s\60601s01.dat
// 0 Author: Ulrich Röder [UR]
// 0 !LDRAW_ORG Subpart UPDATE 2019-01
// 0 !LICENSE Licensed under CC BY 2.0 and CC BY 4.0 : see CAreadme.txt
// 
// 0 BFC CERTIFY CCW
  [0,"BFC","CERTIFY"],
  [0,"BFC","CCW"],
// 
// 0 !HISTORY 2019-06-28 [PTadmin] Official Update 2019-01
// 
// 
// 1 16 9.25 21.5 -7 0 0 7.25 17.5 0 0 0 4 0 box4-4a.dat
  [1,16,9.25,21.5,-7,0,0,7.25,17.5,0,0,0,4,0, ldraw_lib__box4_4a(realsolid)],
// 1 16 -9.25 21.5 -7 0 0 -7.25 17.5 0 0 0 4 0 box4-4a.dat
  [1,16,-9.25,21.5,-7,0,0,-7.25,17.5,0,0,0,4,0, ldraw_lib__box4_4a(realsolid)],
// 1 16 0 4 -7 2 0 0 0 0 -2 0 4 0 2-4cylo.dat
  [1,16,0,4,-7,2,0,0,0,0,-2,0,4,0, ldraw_lib__2_4cylo(realsolid)],
// 1 16 0 4 -7 2 0 0 0 0 -2 0 1 0 2-4chrd.dat
  [1,16,0,4,-7,2,0,0,0,0,-2,0,1,0, ldraw_lib__2_4chrd(realsolid)],
// 1 16 0 4 -3 -2 0 0 0 0 -2 0 -1 0 2-4chrd.dat
  [1,16,0,4,-3,-2,0,0,0,0,-2,0,-1,0, ldraw_lib__2_4chrd(realsolid)],
// 1 16 0 39 -7 -2 0 0 0 0 2 0 4 0 2-4cylo.dat
  [1,16,0,39,-7,-2,0,0,0,0,2,0,4,0, ldraw_lib__2_4cylo(realsolid)],
// 1 16 0 39 -7 -2 0 0 0 0 2 0 1 0 2-4chrd.dat
  [1,16,0,39,-7,-2,0,0,0,0,2,0,1,0, ldraw_lib__2_4chrd(realsolid)],
// 1 16 0 39 -3 2 0 0 0 0 2 0 -1 0 2-4chrd.dat
  [1,16,0,39,-3,2,0,0,0,0,2,0,-1,0, ldraw_lib__2_4chrd(realsolid)],
// 4 16 -2 4 -3 2 4 -3 2 39 -3 -2 39 -3
  [4,16,-2,4,-3,2,4,-3,2,39,-3,-2,39,-3],
// 2 24 2 4 -3 2 4 -7
  [2,24,2,4,-3,2,4,-7],
// 2 24 -2 4 -3 -2 4 -7
  [2,24,-2,4,-3,-2,4,-7],
// 2 24 2 39 -3 2 39 -7
  [2,24,2,39,-3,2,39,-7],
// 2 24 -2 39 -3 -2 39 -7
  [2,24,-2,39,-3,-2,39,-7],
];
module ldraw_lib__s__60601s01(step=0, col=false, unit=2/5, alt=false, line=0.2, solid=!$preview)
    makepoly(ldraw_lib__s__60601s01(solid), step=step, col=col, unit=unit, alt=alt, line=line, solid=solid);
ldraw_lib__s__60601s01(line=0.2);
// main file
use <../lib.scad>
use <s/60601s01.scad>
$fa=1; $fs=0.2;
function ldraw_lib__60601p03(realsolid=false) = [
// 0 Glass for Window  1 x  2 x  2 with 4 Black and 2 Dark Bluish Grey Outlined Rectangles Pattern
// 0 Name: 60601p03.dat
// 0 Author: Gerald Lasser [GeraldLasser]
// 0 !LDRAW_ORG Part UPDATE 2022-01
// 0 !LICENSE Licensed under CC BY 2.0 and CC BY 4.0 : see CAreadme.txt
// 
// 0 BFC CERTIFY CCW
  [0,"BFC","CERTIFY"],
  [0,"BFC","CCW"],
// 
// 0 !KEYWORDS BrickLink 60601pb012, Dr. Who, Set 21304, Tardis
// 
// 0 !HISTORY 2020-06-28 [PTadmin] Official Update 2020-01
// 0 !HISTORY 2021-01-16 [cwdee] Update description
// 0 !HISTORY 2022-01-14 [PTadmin] Official Update 2022-01
// 
// 
// 1 16 0 0 0 1 0 0 0 1 0 0 0 1 s\60601s01.dat
  [1,16,0,0,0,1,0,0,0,1,0,0,0,1, ldraw_lib__s__60601s01(realsolid)],
// 
// 4 72 -13.8 20.5 -7 -14.3 21 -7 -5.5 21 -7 -6 20.5 -7
  [4,72,-13.8,20.5,-7,-14.3,21,-7,-5.5,21,-7,-6,20.5,-7],
// 4 0 -4.4 21 -7 4.4 21 -7 4.4 5.3 -7 -4.4 5.3 -7
  [4,0,-4.4,21,-7,4.4,21,-7,4.4,5.3,-7,-4.4,5.3,-7],
// 4 72 -5.5 5.3 -7 -14.3 5.3 -7 -13.8 5.8 -7 -6 5.8 -7
  [4,72,-5.5,5.3,-7,-14.3,5.3,-7,-13.8,5.8,-7,-6,5.8,-7],
// 4 72 -6 5.8 -7 -6 20.5 -7 -5.5 21 -7 -5.5 5.3 -7
  [4,72,-6,5.8,-7,-6,20.5,-7,-5.5,21,-7,-5.5,5.3,-7],
// 4 72 -14.3 5.3 -7 -14.3 21 -7 -13.8 20.5 -7 -13.8 5.8 -7
  [4,72,-14.3,5.3,-7,-14.3,21,-7,-13.8,20.5,-7,-13.8,5.8,-7],
// 4 16 -6 5.8 -7 -13.8 5.8 -7 -13.8 20.5 -7 -6 20.5 -7
  [4,16,-6,5.8,-7,-13.8,5.8,-7,-13.8,20.5,-7,-6,20.5,-7],
// 4 16 -4.4 5.3 -7 -5.5 5.3 -7 -5.5 21 -7 -4.4 21 -7
  [4,16,-4.4,5.3,-7,-5.5,5.3,-7,-5.5,21,-7,-4.4,21,-7],
// 4 72 6 20.5 -7 5.5 21 -7 14.3 21 -7 13.8 20.5 -7
  [4,72,6,20.5,-7,5.5,21,-7,14.3,21,-7,13.8,20.5,-7],
// 4 72 14.3 5.3 -7 5.5 5.3 -7 6 5.8 -7 13.8 5.8 -7
  [4,72,14.3,5.3,-7,5.5,5.3,-7,6,5.8,-7,13.8,5.8,-7],
// 4 72 13.8 5.8 -7 13.8 20.5 -7 14.3 21 -7 14.3 5.3 -7
  [4,72,13.8,5.8,-7,13.8,20.5,-7,14.3,21,-7,14.3,5.3,-7],
// 4 72 5.5 5.3 -7 5.5 21 -7 6 20.5 -7 6 5.8 -7
  [4,72,5.5,5.3,-7,5.5,21,-7,6,20.5,-7,6,5.8,-7],
// 4 16 13.8 5.8 -7 6 5.8 -7 6 20.5 -7 13.8 20.5 -7
  [4,16,13.8,5.8,-7,6,5.8,-7,6,20.5,-7,13.8,20.5,-7],
// 4 16 5.5 5.3 -7 4.4 5.3 -7 4.4 21 -7 5.5 21 -7
  [4,16,5.5,5.3,-7,4.4,5.3,-7,4.4,21,-7,5.5,21,-7],
// 4 0 4.4 22 -7 -4.4 22 -7 -4.4 37.7 -7 4.4 37.7 -7
  [4,0,4.4,22,-7,-4.4,22,-7,-4.4,37.7,-7,4.4,37.7,-7],
// 4 0 -5.5 22 -7 -14.3 22 -7 -14.3 37.7 -7 -5.5 37.7 -7
  [4,0,-5.5,22,-7,-14.3,22,-7,-14.3,37.7,-7,-5.5,37.7,-7],
// 4 0 14.3 22 -7 5.5 22 -7 5.5 37.7 -7 14.3 37.7 -7
  [4,0,14.3,22,-7,5.5,22,-7,5.5,37.7,-7,14.3,37.7,-7],
// 4 16 -5.5 21 -7 -14.3 21 -7 -14.3 22 -7 -5.5 22 -7
  [4,16,-5.5,21,-7,-14.3,21,-7,-14.3,22,-7,-5.5,22,-7],
// 4 16 -4.4 21 -7 -5.5 21 -7 -5.5 22 -7 -4.4 22 -7
  [4,16,-4.4,21,-7,-5.5,21,-7,-5.5,22,-7,-4.4,22,-7],
// 4 16 4.4 21 -7 -4.4 21 -7 -4.4 22 -7 4.4 22 -7
  [4,16,4.4,21,-7,-4.4,21,-7,-4.4,22,-7,4.4,22,-7],
// 4 16 5.5 21 -7 4.4 21 -7 4.4 22 -7 5.5 22 -7
  [4,16,5.5,21,-7,4.4,21,-7,4.4,22,-7,5.5,22,-7],
// 4 16 14.3 21 -7 5.5 21 -7 5.5 22 -7 14.3 22 -7
  [4,16,14.3,21,-7,5.5,21,-7,5.5,22,-7,14.3,22,-7],
// 4 16 -4.4 22 -7 -5.5 22 -7 -5.5 37.7 -7 -4.4 37.7 -7
  [4,16,-4.4,22,-7,-5.5,22,-7,-5.5,37.7,-7,-4.4,37.7,-7],
// 4 16 5.5 22 -7 4.4 22 -7 4.4 37.7 -7 5.5 37.7 -7
  [4,16,5.5,22,-7,4.4,22,-7,4.4,37.7,-7,5.5,37.7,-7],
// 4 16 -4.4 37.7 -7 -2 39 -7 2 39 -7 4.4 37.7 -7
  [4,16,-4.4,37.7,-7,-2,39,-7,2,39,-7,4.4,37.7,-7],
// 3 16 5.5 37.7 -7 4.4 37.7 -7 2 39 -7
  [3,16,5.5,37.7,-7,4.4,37.7,-7,2,39,-7],
// 4 16 14.3 37.7 -7 5.5 37.7 -7 2 39 -7 16.5 39 -7
  [4,16,14.3,37.7,-7,5.5,37.7,-7,2,39,-7,16.5,39,-7],
// 3 16 14.3 22 -7 14.3 37.7 -7 16.5 39 -7
  [3,16,14.3,22,-7,14.3,37.7,-7,16.5,39,-7],
// 4 16 14.3 21 -7 14.3 22 -7 16.5 39 -7 16.5 4 -7
  [4,16,14.3,21,-7,14.3,22,-7,16.5,39,-7,16.5,4,-7],
// 3 16 16.5 4 -7 14.3 5.3 -7 14.3 21 -7
  [3,16,16.5,4,-7,14.3,5.3,-7,14.3,21,-7],
// 3 16 16.5 4 -7 5.5 5.3 -7 14.3 5.3 -7
  [3,16,16.5,4,-7,5.5,5.3,-7,14.3,5.3,-7],
// 4 16 4.4 5.3 -7 5.5 5.3 -7 16.5 4 -7 2 4 -7
  [4,16,4.4,5.3,-7,5.5,5.3,-7,16.5,4,-7,2,4,-7],
// 4 16 4.4 5.3 -7 2 4 -7 -2 4 -7 -4.4 5.3 -7
  [4,16,4.4,5.3,-7,2,4,-7,-2,4,-7,-4.4,5.3,-7],
// 3 16 -2 4 -7 -5.5 5.3 -7 -4.4 5.3 -7
  [3,16,-2,4,-7,-5.5,5.3,-7,-4.4,5.3,-7],
// 4 16 -14.3 5.3 -7 -5.5 5.3 -7 -2 4 -7 -16.5 4 -7
  [4,16,-14.3,5.3,-7,-5.5,5.3,-7,-2,4,-7,-16.5,4,-7],
// 3 16 -16.5 4 -7 -14.3 21 -7 -14.3 5.3 -7
  [3,16,-16.5,4,-7,-14.3,21,-7,-14.3,5.3,-7],
// 4 16 -14.3 22 -7 -14.3 21 -7 -16.5 4 -7 -16.5 39 -7
  [4,16,-14.3,22,-7,-14.3,21,-7,-16.5,4,-7,-16.5,39,-7],
// 3 16 -14.3 22 -7 -16.5 39 -7 -14.3 37.7 -7
  [3,16,-14.3,22,-7,-16.5,39,-7,-14.3,37.7,-7],
// 4 16 -5.5 37.7 -7 -14.3 37.7 -7 -16.5 39 -7 -2 39 -7
  [4,16,-5.5,37.7,-7,-14.3,37.7,-7,-16.5,39,-7,-2,39,-7],
// 3 16 -4.4 37.7 -7 -5.5 37.7 -7 -2 39 -7
  [3,16,-4.4,37.7,-7,-5.5,37.7,-7,-2,39,-7],
];
module ldraw_lib__60601p03(step=0, col=false, unit=2/5, alt=false, line=0.2, solid=!$preview)
    makepoly(ldraw_lib__60601p03(solid), step=step, col=col, unit=unit, alt=alt, line=line, solid=solid);
ldraw_lib__60601p03(line=0.2);
